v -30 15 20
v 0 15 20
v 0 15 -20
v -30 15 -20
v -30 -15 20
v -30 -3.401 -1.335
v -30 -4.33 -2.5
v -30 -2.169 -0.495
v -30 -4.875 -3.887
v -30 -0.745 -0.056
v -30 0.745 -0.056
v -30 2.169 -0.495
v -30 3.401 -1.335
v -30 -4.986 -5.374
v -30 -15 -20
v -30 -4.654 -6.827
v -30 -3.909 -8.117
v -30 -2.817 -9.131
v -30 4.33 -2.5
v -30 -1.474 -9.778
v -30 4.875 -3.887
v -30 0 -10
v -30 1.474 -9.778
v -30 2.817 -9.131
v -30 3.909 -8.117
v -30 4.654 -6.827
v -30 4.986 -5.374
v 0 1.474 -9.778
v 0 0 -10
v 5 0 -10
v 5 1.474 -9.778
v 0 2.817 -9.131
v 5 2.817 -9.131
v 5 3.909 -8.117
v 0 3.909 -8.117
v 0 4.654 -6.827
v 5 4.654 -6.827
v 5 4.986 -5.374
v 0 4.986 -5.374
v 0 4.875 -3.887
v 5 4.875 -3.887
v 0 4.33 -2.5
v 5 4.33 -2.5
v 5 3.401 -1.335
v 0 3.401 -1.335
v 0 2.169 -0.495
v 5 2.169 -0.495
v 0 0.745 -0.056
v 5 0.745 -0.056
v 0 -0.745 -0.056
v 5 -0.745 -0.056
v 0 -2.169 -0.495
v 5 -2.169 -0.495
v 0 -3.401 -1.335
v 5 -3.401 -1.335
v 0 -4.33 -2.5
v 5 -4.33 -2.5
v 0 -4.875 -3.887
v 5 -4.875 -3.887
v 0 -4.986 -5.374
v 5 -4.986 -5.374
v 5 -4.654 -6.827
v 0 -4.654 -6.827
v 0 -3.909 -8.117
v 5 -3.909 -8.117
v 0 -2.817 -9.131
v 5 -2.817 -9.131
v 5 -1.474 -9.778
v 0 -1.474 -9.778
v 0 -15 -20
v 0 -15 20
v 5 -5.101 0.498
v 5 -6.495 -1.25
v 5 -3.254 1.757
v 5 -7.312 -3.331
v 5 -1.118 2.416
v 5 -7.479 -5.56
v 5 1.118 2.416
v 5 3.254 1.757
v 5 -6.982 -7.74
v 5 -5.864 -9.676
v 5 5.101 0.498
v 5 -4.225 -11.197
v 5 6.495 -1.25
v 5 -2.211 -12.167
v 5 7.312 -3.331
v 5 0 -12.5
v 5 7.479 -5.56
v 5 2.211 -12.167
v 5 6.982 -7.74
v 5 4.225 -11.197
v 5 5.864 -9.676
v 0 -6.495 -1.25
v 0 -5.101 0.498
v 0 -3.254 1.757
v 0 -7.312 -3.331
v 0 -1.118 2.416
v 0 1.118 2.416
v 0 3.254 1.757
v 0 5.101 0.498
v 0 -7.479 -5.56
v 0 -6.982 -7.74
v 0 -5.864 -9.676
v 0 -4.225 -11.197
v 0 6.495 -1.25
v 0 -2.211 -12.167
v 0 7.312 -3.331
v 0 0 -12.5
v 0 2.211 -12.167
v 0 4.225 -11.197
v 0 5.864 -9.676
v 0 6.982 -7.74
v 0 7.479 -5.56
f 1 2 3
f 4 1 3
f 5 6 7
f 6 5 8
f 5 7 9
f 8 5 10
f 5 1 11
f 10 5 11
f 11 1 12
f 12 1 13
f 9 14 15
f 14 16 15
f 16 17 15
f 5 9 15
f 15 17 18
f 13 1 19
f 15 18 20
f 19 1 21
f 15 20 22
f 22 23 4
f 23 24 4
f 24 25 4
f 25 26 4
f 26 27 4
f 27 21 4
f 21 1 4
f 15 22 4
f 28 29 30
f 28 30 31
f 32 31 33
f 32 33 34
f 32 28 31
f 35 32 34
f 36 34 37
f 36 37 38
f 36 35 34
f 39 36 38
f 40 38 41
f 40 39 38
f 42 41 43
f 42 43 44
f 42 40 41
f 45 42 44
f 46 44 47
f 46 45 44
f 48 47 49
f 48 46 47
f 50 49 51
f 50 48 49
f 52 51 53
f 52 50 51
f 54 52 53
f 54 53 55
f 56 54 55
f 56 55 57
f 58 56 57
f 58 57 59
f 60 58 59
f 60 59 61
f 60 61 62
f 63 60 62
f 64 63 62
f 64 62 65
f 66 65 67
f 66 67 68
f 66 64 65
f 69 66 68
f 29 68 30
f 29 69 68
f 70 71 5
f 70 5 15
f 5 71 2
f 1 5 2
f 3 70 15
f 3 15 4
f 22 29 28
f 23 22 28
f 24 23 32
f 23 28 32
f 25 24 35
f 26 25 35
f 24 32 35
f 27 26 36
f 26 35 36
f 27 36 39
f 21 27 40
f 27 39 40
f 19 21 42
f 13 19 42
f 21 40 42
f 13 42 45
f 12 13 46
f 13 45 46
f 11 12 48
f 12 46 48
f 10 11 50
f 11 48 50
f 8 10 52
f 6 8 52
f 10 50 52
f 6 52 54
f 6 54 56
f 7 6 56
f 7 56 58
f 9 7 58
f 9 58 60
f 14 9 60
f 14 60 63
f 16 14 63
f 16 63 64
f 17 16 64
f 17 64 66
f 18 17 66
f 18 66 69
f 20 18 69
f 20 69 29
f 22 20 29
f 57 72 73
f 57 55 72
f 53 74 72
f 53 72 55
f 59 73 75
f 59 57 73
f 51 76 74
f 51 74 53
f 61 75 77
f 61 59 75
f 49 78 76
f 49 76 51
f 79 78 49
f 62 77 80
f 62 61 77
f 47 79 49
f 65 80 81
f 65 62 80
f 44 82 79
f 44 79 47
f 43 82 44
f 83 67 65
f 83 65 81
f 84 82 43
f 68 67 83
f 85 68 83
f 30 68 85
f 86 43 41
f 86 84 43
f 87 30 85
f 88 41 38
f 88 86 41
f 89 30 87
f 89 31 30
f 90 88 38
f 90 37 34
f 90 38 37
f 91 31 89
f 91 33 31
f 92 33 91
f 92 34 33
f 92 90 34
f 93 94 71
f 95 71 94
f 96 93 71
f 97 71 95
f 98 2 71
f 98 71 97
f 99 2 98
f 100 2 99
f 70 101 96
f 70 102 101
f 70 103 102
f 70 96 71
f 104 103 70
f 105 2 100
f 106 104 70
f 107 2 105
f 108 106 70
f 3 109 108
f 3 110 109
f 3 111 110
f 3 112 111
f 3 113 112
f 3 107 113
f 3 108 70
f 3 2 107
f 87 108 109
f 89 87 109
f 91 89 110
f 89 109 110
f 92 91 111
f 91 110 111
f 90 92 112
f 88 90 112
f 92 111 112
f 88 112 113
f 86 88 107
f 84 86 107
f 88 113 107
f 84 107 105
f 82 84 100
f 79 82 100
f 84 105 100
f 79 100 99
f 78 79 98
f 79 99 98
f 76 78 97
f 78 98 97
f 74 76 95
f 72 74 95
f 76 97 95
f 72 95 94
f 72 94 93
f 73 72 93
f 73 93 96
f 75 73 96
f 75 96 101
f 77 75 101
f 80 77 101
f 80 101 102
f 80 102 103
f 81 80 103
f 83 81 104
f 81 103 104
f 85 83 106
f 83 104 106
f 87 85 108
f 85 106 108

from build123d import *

# Parameters (mm, degrees)
SKETCH_1_W          = 40
SKETCH_1_H          = 30
EXTRUDE_1_DEPTH     = 30
SKETCH_2_R          = 7.5
SKETCH_2_R_2        = 5
EXTRUDE_2_DEPTH     = 5
SKETCH_2_2_R        = 5
CUT_EXTRUDE_1_DEPTH = 40.05124838


with BuildPart() as part:
    # Эскиз1 → Бобышка-Вытянуть1 (new body)
    with BuildSketch(Plane(origin=(0, 0, 0), x_dir=(0, 0, -1), z_dir=(1, 0, 0))):
        Rectangle(SKETCH_1_W, SKETCH_1_H)
    extrude(amount=-EXTRUDE_1_DEPTH)

    # Эскиз2 → Бобышка-Вытянуть2 (add)
    with BuildSketch(Plane(origin=(0, 0, 0), x_dir=(0, 0, -1), z_dir=(1, 0, 0))):
        with Locations((5, 0)):
            Circle(SKETCH_2_R)
        with Locations((5, 0)):
            Circle(SKETCH_2_R_2, mode=Mode.SUBTRACT)
    extrude(amount=EXTRUDE_2_DEPTH)

    # Эскиз2<2> → Вырез-Вытянуть1 (cut, through all)
    with BuildSketch(Plane(origin=(0, 0, 0), x_dir=(0, 0, -1), z_dir=(1, 0, 0))):
        with Locations((5, 0)):
            Circle(SKETCH_2_2_R)
    extrude(amount=-CUT_EXTRUDE_1_DEPTH, mode=Mode.SUBTRACT)


solid = part.part
